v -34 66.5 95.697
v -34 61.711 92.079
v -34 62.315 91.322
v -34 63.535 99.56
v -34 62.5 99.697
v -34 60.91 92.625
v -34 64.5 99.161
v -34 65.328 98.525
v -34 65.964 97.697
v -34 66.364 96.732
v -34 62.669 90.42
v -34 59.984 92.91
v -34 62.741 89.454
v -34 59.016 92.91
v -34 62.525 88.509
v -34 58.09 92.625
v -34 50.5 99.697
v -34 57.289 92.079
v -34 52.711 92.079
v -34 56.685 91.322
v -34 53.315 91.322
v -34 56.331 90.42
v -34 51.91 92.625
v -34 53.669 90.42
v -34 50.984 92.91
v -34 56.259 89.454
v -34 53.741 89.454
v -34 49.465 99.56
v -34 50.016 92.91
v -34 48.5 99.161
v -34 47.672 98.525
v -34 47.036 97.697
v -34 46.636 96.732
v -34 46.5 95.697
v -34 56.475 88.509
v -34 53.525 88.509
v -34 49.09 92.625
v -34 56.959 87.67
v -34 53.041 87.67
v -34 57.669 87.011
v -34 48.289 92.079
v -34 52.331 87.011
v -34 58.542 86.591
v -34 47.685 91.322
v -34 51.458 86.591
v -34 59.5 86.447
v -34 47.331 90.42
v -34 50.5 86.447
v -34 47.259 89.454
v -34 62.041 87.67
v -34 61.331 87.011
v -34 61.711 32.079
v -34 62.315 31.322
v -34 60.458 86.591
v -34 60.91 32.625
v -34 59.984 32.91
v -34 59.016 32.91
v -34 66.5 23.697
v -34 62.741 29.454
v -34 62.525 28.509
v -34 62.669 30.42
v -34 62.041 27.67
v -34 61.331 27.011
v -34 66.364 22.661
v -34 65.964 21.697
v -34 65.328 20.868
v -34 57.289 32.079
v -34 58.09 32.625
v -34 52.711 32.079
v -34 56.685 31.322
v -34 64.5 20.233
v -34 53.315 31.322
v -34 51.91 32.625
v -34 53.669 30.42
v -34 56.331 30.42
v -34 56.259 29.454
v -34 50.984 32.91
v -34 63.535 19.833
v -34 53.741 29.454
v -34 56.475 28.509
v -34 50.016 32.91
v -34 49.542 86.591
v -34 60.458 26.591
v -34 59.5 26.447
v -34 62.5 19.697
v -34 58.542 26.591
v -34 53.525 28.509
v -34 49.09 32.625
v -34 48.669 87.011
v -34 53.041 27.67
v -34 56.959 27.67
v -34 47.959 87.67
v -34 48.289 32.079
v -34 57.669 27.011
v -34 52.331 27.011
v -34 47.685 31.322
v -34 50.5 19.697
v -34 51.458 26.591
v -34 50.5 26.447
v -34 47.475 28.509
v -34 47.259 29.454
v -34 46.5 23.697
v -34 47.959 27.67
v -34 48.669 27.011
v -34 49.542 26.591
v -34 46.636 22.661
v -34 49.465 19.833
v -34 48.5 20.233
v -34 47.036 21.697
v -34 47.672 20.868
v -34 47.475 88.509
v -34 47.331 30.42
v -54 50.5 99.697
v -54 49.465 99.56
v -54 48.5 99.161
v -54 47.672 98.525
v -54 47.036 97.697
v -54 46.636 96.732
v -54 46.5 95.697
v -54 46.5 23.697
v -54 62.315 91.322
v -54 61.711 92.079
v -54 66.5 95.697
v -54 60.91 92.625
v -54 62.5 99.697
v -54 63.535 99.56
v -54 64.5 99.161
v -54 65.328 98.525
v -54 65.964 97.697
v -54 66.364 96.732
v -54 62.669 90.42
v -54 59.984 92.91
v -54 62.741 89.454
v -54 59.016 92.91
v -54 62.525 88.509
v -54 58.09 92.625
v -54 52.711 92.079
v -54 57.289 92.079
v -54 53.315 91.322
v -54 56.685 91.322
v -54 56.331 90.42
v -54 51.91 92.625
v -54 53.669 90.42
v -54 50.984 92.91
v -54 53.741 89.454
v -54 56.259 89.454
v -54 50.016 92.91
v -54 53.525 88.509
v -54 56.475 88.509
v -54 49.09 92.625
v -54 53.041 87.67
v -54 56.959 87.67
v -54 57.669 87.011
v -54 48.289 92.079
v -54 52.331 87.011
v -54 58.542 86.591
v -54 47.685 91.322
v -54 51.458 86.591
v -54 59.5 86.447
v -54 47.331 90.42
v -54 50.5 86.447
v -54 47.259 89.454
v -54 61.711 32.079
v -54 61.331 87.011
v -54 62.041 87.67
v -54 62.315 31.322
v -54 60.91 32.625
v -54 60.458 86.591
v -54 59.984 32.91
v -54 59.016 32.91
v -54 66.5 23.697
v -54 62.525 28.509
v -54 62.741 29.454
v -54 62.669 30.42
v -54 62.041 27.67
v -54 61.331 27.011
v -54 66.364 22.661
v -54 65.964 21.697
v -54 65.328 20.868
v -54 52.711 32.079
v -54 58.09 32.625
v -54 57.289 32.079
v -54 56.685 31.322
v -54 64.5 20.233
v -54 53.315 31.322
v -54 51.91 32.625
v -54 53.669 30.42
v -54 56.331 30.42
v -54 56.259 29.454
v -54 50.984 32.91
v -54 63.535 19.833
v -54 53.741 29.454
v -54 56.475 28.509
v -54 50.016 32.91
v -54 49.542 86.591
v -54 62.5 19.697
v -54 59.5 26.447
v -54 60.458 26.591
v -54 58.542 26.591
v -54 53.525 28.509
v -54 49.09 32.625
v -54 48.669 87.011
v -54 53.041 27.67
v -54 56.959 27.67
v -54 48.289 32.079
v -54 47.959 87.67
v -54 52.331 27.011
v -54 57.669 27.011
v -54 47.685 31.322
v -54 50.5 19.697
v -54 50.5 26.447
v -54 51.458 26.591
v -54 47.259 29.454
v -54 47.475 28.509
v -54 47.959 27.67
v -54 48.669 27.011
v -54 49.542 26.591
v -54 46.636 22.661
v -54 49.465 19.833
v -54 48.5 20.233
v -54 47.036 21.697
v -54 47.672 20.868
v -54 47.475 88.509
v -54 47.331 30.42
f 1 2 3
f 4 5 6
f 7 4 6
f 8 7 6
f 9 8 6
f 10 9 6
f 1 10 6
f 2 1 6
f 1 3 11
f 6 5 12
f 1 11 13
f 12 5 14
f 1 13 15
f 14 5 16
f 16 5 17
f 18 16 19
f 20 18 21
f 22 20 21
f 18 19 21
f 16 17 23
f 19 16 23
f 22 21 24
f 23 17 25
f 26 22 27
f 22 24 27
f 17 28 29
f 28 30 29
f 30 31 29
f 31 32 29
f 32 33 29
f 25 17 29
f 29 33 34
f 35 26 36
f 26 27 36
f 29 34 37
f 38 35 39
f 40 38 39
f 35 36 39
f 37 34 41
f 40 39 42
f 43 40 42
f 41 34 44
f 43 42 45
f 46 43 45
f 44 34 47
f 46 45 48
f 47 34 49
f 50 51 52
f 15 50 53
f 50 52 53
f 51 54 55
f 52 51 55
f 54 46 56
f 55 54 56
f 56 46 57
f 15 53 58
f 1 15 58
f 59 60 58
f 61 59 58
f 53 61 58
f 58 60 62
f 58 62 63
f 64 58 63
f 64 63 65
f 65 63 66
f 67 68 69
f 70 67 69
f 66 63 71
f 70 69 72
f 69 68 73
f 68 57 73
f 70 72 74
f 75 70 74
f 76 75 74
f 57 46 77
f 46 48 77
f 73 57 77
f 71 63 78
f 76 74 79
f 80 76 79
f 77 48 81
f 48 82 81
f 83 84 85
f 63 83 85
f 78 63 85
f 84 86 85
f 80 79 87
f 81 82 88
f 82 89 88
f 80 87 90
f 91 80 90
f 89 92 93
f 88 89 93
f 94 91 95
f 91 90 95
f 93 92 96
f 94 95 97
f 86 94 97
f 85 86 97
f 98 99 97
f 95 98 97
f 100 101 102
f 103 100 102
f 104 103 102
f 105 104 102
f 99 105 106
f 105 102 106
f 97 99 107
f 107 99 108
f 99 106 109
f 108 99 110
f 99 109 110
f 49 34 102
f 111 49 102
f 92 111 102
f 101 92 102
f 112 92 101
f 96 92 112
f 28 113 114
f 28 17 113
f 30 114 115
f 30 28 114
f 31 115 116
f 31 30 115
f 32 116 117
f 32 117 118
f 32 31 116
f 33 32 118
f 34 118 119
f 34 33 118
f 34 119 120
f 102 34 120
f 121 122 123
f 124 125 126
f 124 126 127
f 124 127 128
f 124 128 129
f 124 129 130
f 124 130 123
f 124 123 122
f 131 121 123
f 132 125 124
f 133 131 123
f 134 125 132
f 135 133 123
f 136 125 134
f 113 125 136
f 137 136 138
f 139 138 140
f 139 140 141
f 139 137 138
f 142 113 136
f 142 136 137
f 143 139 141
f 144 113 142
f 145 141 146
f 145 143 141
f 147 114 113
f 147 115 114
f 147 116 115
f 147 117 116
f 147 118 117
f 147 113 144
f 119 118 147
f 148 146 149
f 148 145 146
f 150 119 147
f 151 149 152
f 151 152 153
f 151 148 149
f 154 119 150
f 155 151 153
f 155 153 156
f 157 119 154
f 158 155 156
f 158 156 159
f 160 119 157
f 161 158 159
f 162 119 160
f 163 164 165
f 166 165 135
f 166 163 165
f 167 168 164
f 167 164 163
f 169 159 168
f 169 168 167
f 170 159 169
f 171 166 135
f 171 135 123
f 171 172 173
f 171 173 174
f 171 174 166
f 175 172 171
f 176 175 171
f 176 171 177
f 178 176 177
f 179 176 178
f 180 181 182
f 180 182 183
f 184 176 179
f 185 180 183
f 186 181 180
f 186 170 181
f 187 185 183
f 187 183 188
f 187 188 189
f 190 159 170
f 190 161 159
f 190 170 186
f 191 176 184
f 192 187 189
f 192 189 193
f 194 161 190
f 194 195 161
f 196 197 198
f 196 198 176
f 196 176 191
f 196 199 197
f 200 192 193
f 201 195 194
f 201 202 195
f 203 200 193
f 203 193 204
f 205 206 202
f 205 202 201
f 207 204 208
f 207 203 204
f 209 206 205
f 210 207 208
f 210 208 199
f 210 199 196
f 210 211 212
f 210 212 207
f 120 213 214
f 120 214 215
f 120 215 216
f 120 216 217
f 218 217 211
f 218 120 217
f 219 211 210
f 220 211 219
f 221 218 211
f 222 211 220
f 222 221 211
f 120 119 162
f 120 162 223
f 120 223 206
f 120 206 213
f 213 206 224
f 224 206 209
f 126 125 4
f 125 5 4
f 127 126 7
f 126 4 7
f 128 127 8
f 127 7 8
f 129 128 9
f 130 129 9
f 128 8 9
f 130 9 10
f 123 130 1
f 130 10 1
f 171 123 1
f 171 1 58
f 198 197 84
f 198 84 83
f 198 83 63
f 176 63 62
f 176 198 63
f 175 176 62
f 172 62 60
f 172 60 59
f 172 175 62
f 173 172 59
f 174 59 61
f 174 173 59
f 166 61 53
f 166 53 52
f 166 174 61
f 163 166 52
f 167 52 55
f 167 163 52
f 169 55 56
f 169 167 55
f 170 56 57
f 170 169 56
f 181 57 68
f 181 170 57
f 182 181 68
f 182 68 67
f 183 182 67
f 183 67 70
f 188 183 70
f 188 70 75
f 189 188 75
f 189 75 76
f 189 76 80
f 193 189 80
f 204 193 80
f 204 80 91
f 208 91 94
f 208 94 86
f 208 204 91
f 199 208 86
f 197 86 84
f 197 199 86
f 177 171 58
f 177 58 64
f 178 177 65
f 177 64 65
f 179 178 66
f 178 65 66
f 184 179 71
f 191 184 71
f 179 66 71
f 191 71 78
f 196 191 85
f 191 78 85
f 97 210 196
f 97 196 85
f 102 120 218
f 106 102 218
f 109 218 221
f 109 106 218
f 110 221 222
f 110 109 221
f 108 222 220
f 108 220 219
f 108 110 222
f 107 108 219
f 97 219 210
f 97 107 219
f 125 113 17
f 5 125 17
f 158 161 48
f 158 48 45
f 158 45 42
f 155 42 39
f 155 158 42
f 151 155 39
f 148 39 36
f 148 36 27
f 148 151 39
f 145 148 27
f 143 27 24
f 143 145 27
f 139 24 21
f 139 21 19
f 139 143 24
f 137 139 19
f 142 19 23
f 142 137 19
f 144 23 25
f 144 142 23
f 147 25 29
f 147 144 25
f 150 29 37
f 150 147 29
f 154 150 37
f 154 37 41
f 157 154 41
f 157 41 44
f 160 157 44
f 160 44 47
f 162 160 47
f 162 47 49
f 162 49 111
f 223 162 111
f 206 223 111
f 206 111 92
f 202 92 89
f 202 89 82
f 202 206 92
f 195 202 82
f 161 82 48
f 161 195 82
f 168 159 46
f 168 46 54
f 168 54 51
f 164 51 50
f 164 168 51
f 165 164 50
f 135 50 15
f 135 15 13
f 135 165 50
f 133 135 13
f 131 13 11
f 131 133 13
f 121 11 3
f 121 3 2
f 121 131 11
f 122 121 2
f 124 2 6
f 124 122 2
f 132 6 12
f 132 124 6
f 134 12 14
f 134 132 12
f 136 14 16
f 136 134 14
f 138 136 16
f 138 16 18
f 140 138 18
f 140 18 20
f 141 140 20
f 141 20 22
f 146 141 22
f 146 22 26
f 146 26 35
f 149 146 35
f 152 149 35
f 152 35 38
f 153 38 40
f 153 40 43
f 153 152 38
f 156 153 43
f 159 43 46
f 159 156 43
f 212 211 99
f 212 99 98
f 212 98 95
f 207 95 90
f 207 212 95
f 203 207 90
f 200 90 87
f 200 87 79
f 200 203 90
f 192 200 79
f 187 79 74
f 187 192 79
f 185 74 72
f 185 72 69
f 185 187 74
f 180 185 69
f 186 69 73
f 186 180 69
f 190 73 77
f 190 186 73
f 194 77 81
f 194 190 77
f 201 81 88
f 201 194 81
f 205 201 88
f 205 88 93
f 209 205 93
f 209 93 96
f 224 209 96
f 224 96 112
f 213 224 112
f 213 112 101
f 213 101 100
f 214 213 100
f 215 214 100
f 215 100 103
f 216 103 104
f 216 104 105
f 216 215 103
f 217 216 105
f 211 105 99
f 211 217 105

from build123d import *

# Parameters (mm, degrees)
BOSS_EXTRUDE1_DEPTH      = 90
FILLET1_R                = 7.5
FILLET2_R                = 2
SKETCH2_W                = 20
SKETCH2_H                = 80
SKETCH2_W_2              = 32
BOSS_EXTRUDE2_DEPTH      = 20
SKETCH3_R                = 2.5
BOSS_EXTRUDE3_DEPTH      = 111
BOSS_EXTRUDE4_START      = 7.5
SKETCH4_W                = 80
SKETCH4_H                = 20
SKETCH4_R                = 3.25
BOSS_EXTRUDE4_DEPTH      = 20
MOVE_FACE1_BY            = 1.5
MOVE_FACE2_BY            = 1.5
FILLET3_R                = 4
FILLET4_R                = 4
CUT_EXTRUDE1_DEPTH       = 2
BOSS_EXTRUDE5_DEPTH      = 2
SKETCH7_W                = 58
SKETCH7_H                = 15
CUT_EXTRUDE2_DEPTH       = 0.5
SKETCH8_R                = 10
BOSS_EXTRUDE6_DEPTH      = 1.5
SKETCH10_R               = 4.25
SKETCH10_R_2             = 2.75
CUT_EXTRUDE_THIN1_DEPTH  = 1.5
SKETCH11_RX              = 5
SKETCH11_RY              = 2.5
BOSS_EXTRUDE7_DEPTH      = 1.5
LPATTERN1_COUNT          = 3
LPATTERN1_PITCH          = 24
SKETCH12_RX              = 5
SKETCH12_RY              = 2.5
BOSS_EXTRUDE8_DEPTH      = 1.5
LPATTERN2_START          = 113.13708499
LPATTERN2_DEPTH          = 1.5
FILLET7_R                = 7.5
FILLET5_R                = 5
FILLET6_R                = 2
SHELL1_T                 = -1
SKETCH14_R               = 14
BOSS_EXTRUDE9_DEPTH      = 1
BOSS_EXTRUDE10_DEPTH     = 1
BOSS_EXTRUDE11_START     = -30
BOSS_EXTRUDE11_OUTLINE_R = 13
BOSS_EXTRUDE11_DEPTH     = 10
BOSS_EXTRUDE12_REACH     = 233.484
SKETCH18_R               = 3
SKETCH17_W               = 1.5
SKETCH17_H               = 20
SKETCH17_W_2             = 20
SKETCH17_H_2             = 1.5
EXTRUDE_THIN1_DEPTH      = 63.5
SKETCH20_R               = 12.5
BOSS_EXTRUDE13_DEPTH     = 5
FILLET8_R                = 2


# Read off the part's stored shape, not the designer's step: LPattern2, Body-Move/Copy1, Boss-Extrude11
with BuildPart() as part:
    # Sketch1 → Boss-Extrude1 (new, symmetric)
    with BuildSketch(Plane(origin=(0, 0, 0), x_dir=(0, 0, -1), z_dir=(1, 0, 0))):
        Polygon((0, 0), (0, 45), (-115, 45), (-160, 0), align=None)
    extrude(amount=BOSS_EXTRUDE1_DEPTH, both=True)

    # Fillet1
    fillet1_edges = [part.edges().sort_by_distance(p)[0] for p in [
        (0, 0, 160),
        (0, 45, 115),
        (0, 45, 0),
        (0, 0, 0),
    ]]
    fillet(fillet1_edges, radius=FILLET1_R)

    # Fillet2
    fillet2_edges = [part.edges().sort_by_distance(p)[0] for p in [
        (-90, 0, 74.696699141),
        (90, 0, 74.696699141),
        (-90, 27.803300859, 132.196699141),
        (-90, 45, 59.696699141),
        (-90, 22.5, 0),
        (-90, 44.429096494, 114.763524025),
        (-90, 2.196699141, 2.196699141),
        (-90, 42.803300859, 2.196699141),
        (-90, 4.629874257, 148.822494776),
        (90, 27.803300859, 132.196699141),
        (90, 22.5, 0),
        (90, 45, 59.696699141),
        (90, 44.429096494, 114.763524025),
        (90, 2.196699141, 2.196699141),
        (90, 42.803300859, 2.196699141),
        (90, 4.629874257, 148.822494776),
    ]]
    fillet(fillet2_edges, radius=FILLET2_R)

    # Sketch2 → Boss-Extrude2 (add)
    with BuildSketch(Plane(origin=(0, 45, 0), x_dir=(1, 0, 0), z_dir=(0, 1, 0))):
        with Locations((-71.5, -59.696699141)):
            Rectangle(SKETCH2_W, SKETCH2_H)
        with Locations((65.5, -59.696699141)):
            Rectangle(SKETCH2_W_2, SKETCH2_H)
    extrude(amount=BOSS_EXTRUDE2_DEPTH)

    # Sketch3 → Boss-Extrude3 (add)
    with BuildSketch(Plane(origin=(-61.5, 0, 0), x_dir=(0, 0, -1), z_dir=(1, 0, 0))):
        with Locations(Location((-89.696699141, 59.5, 0), (0, 0, 180))):
            Circle(SKETCH3_R)
        with Locations(Location((-89.696699141, 50.5, 0), (0, 0, 180))):
            Circle(SKETCH3_R)
        with Locations(Location((-29.696699141, 50.5, 0), (0, 0, 180))):
            Circle(SKETCH3_R)
        with Locations(Location((-29.696699141, 59.5, 0), (0, 0, 180))):
            Circle(SKETCH3_R)
    extrude(amount=BOSS_EXTRUDE3_DEPTH)

    # Fillet3
    fillet3_edges = [part.edges().sort_by_distance(p)[0] for p in [
        (65.5, 65, 99.696699141),
        (65.5, 65, 19.696699141),
        (-71.5, 65, 99.696699141),
        (-71.5, 65, 19.696699141),
    ]]
    fillet(fillet3_edges, radius=FILLET3_R)

    # Sketch5 → Cut-Extrude1 (cut)
    with BuildSketch(Plane(origin=(0, 80, 80), x_dir=(1, 0, 0), z_dir=(0, 0.7071067811865511, 0.707106781186544))):
        with BuildLine():
            Line((-65, -56.317279836), (65, -56.317279836))
            ThreePointArc((65, -56.317279836), (66.767766953, -57.049512883), (67.5, -58.817279836))
            Line((67.5, -58.817279836), (67.5, -88.817279836))
            ThreePointArc((67.5, -88.817279836), (66.767766953, -90.585046789), (65, -91.317279836))
            Line((65, -91.317279836), (-65, -91.317279836))
            ThreePointArc((-65, -91.317279836), (-66.767766953, -90.585046789), (-67.5, -88.817279836))
            Line((-67.5, -88.817279836), (-67.5, -58.817279836))
            ThreePointArc((-67.5, -58.817279836), (-66.767766953, -57.049512883), (-65, -56.317279836))
        make_face()
    extrude(amount=-CUT_EXTRUDE1_DEPTH, mode=Mode.SUBTRACT)


with BuildPart() as body_2:
    # Sketch4 → Boss-Extrude4 (new body)
    with BuildSketch(Plane(origin=(-61.5, 0, 0), x_dir=(0, 0, -1), z_dir=(1, 0, 0)).offset(BOSS_EXTRUDE4_START)):
        with Locations((-59.696699141, 55)):
            Rectangle(SKETCH4_W, SKETCH4_H)
        with Locations((-89.696699141, 59.5)):
            Circle(SKETCH4_R, mode=Mode.SUBTRACT)
        with Locations((-89.696699141, 50.5)):
            Circle(SKETCH4_R, mode=Mode.SUBTRACT)
        with Locations((-29.696699141, 59.5)):
            Circle(SKETCH4_R, mode=Mode.SUBTRACT)
        with Locations((-29.696699141, 50.5)):
            Circle(SKETCH4_R, mode=Mode.SUBTRACT)
    extrude(amount=BOSS_EXTRUDE4_DEPTH)

    # Move Face1: a face moved outward by 1.5
    extrude(body_2.faces().sort_by_distance((-44, 65, 59.696699141))[0], amount=MOVE_FACE1_BY, dir=(0, 1, 0))

    # Move Face2: a face moved inward by 1.5
    extrude(body_2.faces().sort_by_distance((-44, 45, 59.696699141))[0], amount=MOVE_FACE2_BY, dir=(0, 1, 0), mode=Mode.SUBTRACT)

    # Fillet4
    fillet4_edges = [body_2.edges().sort_by_distance(p)[0] for p in [
        (-44, 66.5, 99.696699141),
        (-44, 66.5, 19.696699141),
        (-44, 46.5, 19.696699141),
        (-44, 46.5, 99.696699141),
    ]]
    fillet(fillet4_edges, radius=FILLET4_R)


with BuildPart() as body_3:
    # Sketch6 → Boss-Extrude5 (new body)
    with BuildSketch(Plane(origin=(0, 78.585786438, 78.585786438), x_dir=(1, 0, 0), z_dir=(0, 0.7071067811865509, 0.7071067811865441))):
        with BuildLine():
            Line((65, -56.317279836), (-65, -56.317279836))
            ThreePointArc((-65, -56.317279836), (-66.767766953, -57.049512883), (-67.5, -58.817279836))
            Line((-67.5, -58.817279836), (-67.5, -88.817279836))
            ThreePointArc((-67.5, -88.817279836), (-66.767766953, -90.585046789), (-65, -91.317279836))
            Line((-65, -91.317279836), (65, -91.317279836))
            ThreePointArc((65, -91.317279836), (66.767766953, -90.585046789), (67.5, -88.817279836))
            Line((67.5, -88.817279836), (67.5, -58.817279836))
            ThreePointArc((67.5, -58.817279836), (66.767766953, -57.049512883), (65, -56.317279836))
        make_face()
    extrude(amount=BOSS_EXTRUDE5_DEPTH)

    # Sketch7 → Cut-Extrude2 (cut)
    with BuildSketch(Plane(origin=(0, 80, 80), x_dir=(1, 0, 0), z_dir=(0, 0.7071067811865509, 0.7071067811865441))):
        with Locations((-28.5, -71.817279836)):
            Rectangle(SKETCH7_W, SKETCH7_H)
    extrude(amount=-CUT_EXTRUDE2_DEPTH, mode=Mode.SUBTRACT)

    # Sketch8 → Boss-Extrude6 (add)
    with BuildSketch(Plane(origin=(0, 80, 80), x_dir=(1, 0, 0), z_dir=(0, 0.7071067811865509, 0.7071067811865441))):
        with Locations(Location((15.5, -71.817279836, 0), (0, 0, 270))):
            Circle(SKETCH8_R)
    extrude(amount=BOSS_EXTRUDE6_DEPTH)

    # Sketch10 → Cut-Extrude-Thin1 (cut)
    # profile 1 of 5: a face of its own
    with BuildSketch(Plane(origin=(0, 81.060660172, 81.060660172), x_dir=(1, 0, 0), z_dir=(0, 0.7071067811865509, 0.7071067811865441))):
        with Locations((15.5, -71.817279836)):
            Circle(SKETCH10_R)
        with Locations((15.5, -71.817279836)):
            Circle(SKETCH10_R_2, mode=Mode.SUBTRACT)
    # profile 2 of 5: a face of its own
    with BuildSketch(Plane(origin=(0, 81.060660172, 81.060660172), x_dir=(1, 0, 0), z_dir=(0, 0.7071067811865509, 0.7071067811865441))):
        Polygon((7.898602102, -65.27654211), (12.49479618, -69.872736188), (13.555456352, -68.812076016), (8.959262274, -64.215881939), align=None)
    # profile 3 of 5: a face of its own
    with BuildSketch(Plane(origin=(0, 81.060660172, 81.060660172), x_dir=(1, 0, 0), z_dir=(0, 0.7071067811865509, 0.7071067811865441))):
        Polygon((22.040737726, -64.215881939), (17.444543648, -68.812076016), (18.50520382, -69.872736188), (23.101397898, -65.27654211), align=None)
    # profile 4 of 5: a face of its own
    with BuildSketch(Plane(origin=(0, 81.060660172, 81.060660172), x_dir=(1, 0, 0), z_dir=(0, 0.7071067811865509, 0.7071067811865441))):
        Polygon((17.444543648, -74.822483656), (22.040737726, -79.418677734), (23.101397898, -78.358017562), (18.50520382, -73.761823485), align=None)
    # profile 5 of 5: a face of its own
    with BuildSketch(Plane(origin=(0, 81.060660172, 81.060660172), x_dir=(1, 0, 0), z_dir=(0, 0.7071067811865509, 0.7071067811865441))):
        Polygon((12.49479618, -73.761823485), (7.898602102, -78.358017562), (8.959262274, -79.418677734), (13.555456352, -74.822483656), align=None)
    extrude(amount=-CUT_EXTRUDE_THIN1_DEPTH, mode=Mode.SUBTRACT)

    # Sketch11 → Boss-Extrude7 (add)
    with BuildSketch(Plane(origin=(0, 80, 80), x_dir=(1, 0, 0), z_dir=(0, 0.7071067811865509, 0.7071067811865441))):
        with Locations((-52.5, -85.317279836)):
            Ellipse(SKETCH11_RX, SKETCH11_RY)
    boss_extrude7 = extrude(amount=BOSS_EXTRUDE7_DEPTH)

    # LPattern1: Boss-Extrude7 ×3
    with Locations(*[(i * LPATTERN1_PITCH, 0, 0) for i in range(1, LPATTERN1_COUNT)]):
        add(boss_extrude7)

    # Sketch12 → Boss-Extrude8 (add)
    with BuildSketch(Plane(origin=(0, 80, 80), x_dir=(1, 0, 0), z_dir=(0, 0.7071067811865509, 0.7071067811865441))):
        with Locations((32.5, -66.317279836)):
            Ellipse(SKETCH12_RX, SKETCH12_RY)
    extrude(amount=BOSS_EXTRUDE8_DEPTH)

    # LPattern2 outline → LPattern2 (add)
    with BuildSketch(Plane(origin=(0, 0, 0), x_dir=(1, 0, 0), z_dir=(0, 0.707106781186551, 0.7071067811865439)).offset(LPATTERN2_START)):
        with BuildLine():
            add(Edge.make_bspline(
                [(37.5, -74.317279836), (37.5, -69.987152818), (30, -72.152216327), (22.5, -74.317279836), (30, -76.482343346), (37.5, -78.647406855), (37.5, -74.317279836)],
                knots=[0, 0, 0, 2.094395102, 2.094395102, 4.188790205, 4.188790205, 6.283185307, 6.283185307, 6.283185307], degree=2, weights=[1, 0.5, 1, 0.5, 1, 0.5, 1]))
        make_face()
        with BuildLine():
            add(Edge.make_bspline(
                [(37.5, -82.317279836), (37.5, -77.987152818), (30, -80.152216327), (22.5, -82.317279836), (30, -84.482343346), (37.5, -86.647406855), (37.5, -82.317279836)],
                knots=[0, 0, 0, 2.094395102, 2.094395102, 4.188790205, 4.188790205, 6.283185307, 6.283185307, 6.283185307], degree=2, weights=[1, 0.5, 1, 0.5, 1, 0.5, 1]))
        make_face()
        with BuildLine():
            add(Edge.make_bspline(
                [(49.5, -66.317279836), (49.5, -61.987152818), (42, -64.152216327), (34.5, -66.317279836), (42, -68.482343346), (49.5, -70.647406855), (49.5, -66.317279836)],
                knots=[0, 0, 0, 2.094395102, 2.094395102, 4.188790205, 4.188790205, 6.283185307, 6.283185307, 6.283185307], degree=2, weights=[1, 0.5, 1, 0.5, 1, 0.5, 1]))
        make_face()
        with BuildLine():
            add(Edge.make_bspline(
                [(49.5, -74.317279836), (49.5, -69.987152818), (42, -72.152216327), (34.5, -74.317279836), (42, -76.482343346), (49.5, -78.647406855), (49.5, -74.317279836)],
                knots=[0, 0, 0, 2.094395102, 2.094395102, 4.188790205, 4.188790205, 6.283185307, 6.283185307, 6.283185307], degree=2, weights=[1, 0.5, 1, 0.5, 1, 0.5, 1]))
        make_face()
        with BuildLine():
            add(Edge.make_bspline(
                [(49.5, -82.317279836), (49.5, -77.987152818), (42, -80.152216327), (34.5, -82.317279836), (42, -84.482343346), (49.5, -86.647406855), (49.5, -82.317279836)],
                knots=[0, 0, 0, 2.094395102, 2.094395102, 4.188790205, 4.188790205, 6.283185307, 6.283185307, 6.283185307], degree=2, weights=[1, 0.5, 1, 0.5, 1, 0.5, 1]))
        make_face()
        with BuildLine():
            add(Edge.make_bspline(
                [(61.5, -66.317279836), (61.5, -61.987152818), (54, -64.152216327), (46.5, -66.317279836), (54, -68.482343346), (61.5, -70.647406855), (61.5, -66.317279836)],
                knots=[0, 0, 0, 2.094395102, 2.094395102, 4.188790205, 4.188790205, 6.283185307, 6.283185307, 6.283185307], degree=2, weights=[1, 0.5, 1, 0.5, 1, 0.5, 1]))
        make_face()
        with BuildLine():
            add(Edge.make_bspline(
                [(61.5, -74.317279836), (61.5, -69.987152818), (54, -72.152216327), (46.5, -74.317279836), (54, -76.482343346), (61.5, -78.647406855), (61.5, -74.317279836)],
                knots=[0, 0, 0, 2.094395102, 2.094395102, 4.188790205, 4.188790205, 6.283185307, 6.283185307, 6.283185307], degree=2, weights=[1, 0.5, 1, 0.5, 1, 0.5, 1]))
        make_face()
        with BuildLine():
            add(Edge.make_bspline(
                [(61.5, -82.317279836), (61.5, -77.987152818), (54, -80.152216327), (46.5, -82.317279836), (54, -84.482343346), (61.5, -86.647406855), (61.5, -82.317279836)],
                knots=[0, 0, 0, 2.094395102, 2.094395102, 4.188790205, 4.188790205, 6.283185307, 6.283185307, 6.283185307], degree=2, weights=[1, 0.5, 1, 0.5, 1, 0.5, 1]))
        make_face()
    extrude(amount=LPATTERN2_DEPTH)


with BuildPart() as body_4:
    # Sketch13 → Revolve1 (revolve)
    with BuildSketch(Plane.XY.offset(59.696699141), mode=Mode.PRIVATE) as revolve1_sk:
        Polygon((11.5, 70), (11.5, 85), (105.301145933, 85), (111.5, 74.263269807), (121.5, 72.5), (121.5, 70), align=None)
    revolve(revolve1_sk.sketch.rotate(Axis((11.5, 70, 59.696699141), (1, 0, 0)), 90), axis=Axis((11.5, 70, 59.696699141), (1, 0, 0)))

    # Fillet5
    fillet5_edges = [body_4.edges().sort_by_distance(p)[0] for p in [
        (105.301145933, 70, 44.696699141),
    ]]
    fillet(fillet5_edges, radius=FILLET5_R)

    # Fillet6
    fillet6_edges = [body_4.edges().sort_by_distance(p)[0] for p in [
        (111.5, 70, 55.433429334),
    ]]
    fillet(fillet6_edges, radius=FILLET6_R)

    # Shell1
    shell1_openings = [body_4.faces().sort_by_distance(p)[0] for p in [
        (121.5, 70, 59.696699141),
        (11.5, 70, 59.696699141),
    ]]
    offset(amount=SHELL1_T, openings=shell1_openings, kind=Kind.INTERSECTION)

    # Sketch14 → Boss-Extrude9 (add)
    with BuildSketch(Plane.ZY.offset(-11.5)):
        with BuildLine():
            Line((55.696699141, 85.491933385), (40.696699141, 81.618950039))
            ThreePointArc((40.696699141, 81.618950039), (31.696699141, 70), (40.696699141, 58.381049961))
            Line((40.696699141, 58.381049961), (55.696699141, 54.508066615))
            ThreePointArc((55.696699141, 54.508066615), (59.696699141, 54), (63.696699141, 54.508066615))
            Line((63.696699141, 54.508066615), (78.696699141, 58.381049961))
            ThreePointArc((78.696699141, 58.381049961), (87.696699141, 70), (78.696699141, 81.618950039))
            Line((78.696699141, 81.618950039), (63.696699141, 85.491933385))
            ThreePointArc((63.696699141, 85.491933385), (59.696699141, 86), (55.696699141, 85.491933385))
        make_face()
        with Locations((59.696699141, 70)):
            Circle(SKETCH14_R, mode=Mode.SUBTRACT)
    extrude(amount=BOSS_EXTRUDE9_DEPTH)


with BuildPart() as body_5:
    # Body-Move/Copy1 outline → Body-Move/Copy1 (revolve)
    with BuildSketch(Plane(origin=(0, 70, 59.696699141), x_dir=(0, 1, 0), z_dir=(0, 0, -1))):
        Polygon((0, 121.5), (0, 11.5), (15, 11.5), (15, 105.301145933), (4.263269807, 111.5), (2.5, 121.5), align=None)
    revolve(axis=Axis((0, 70, 59.696699141), (1, 0, 0)))


with BuildPart() as part_1:
    add(part.part)

    # Combine1: cut body 5
    add(body_5.part, mode=Mode.SUBTRACT)

    # Fillet7
    fillet7_edges = [part_1.edges().sort_by_distance(p)[0] for p in [
        (65.5, 65, 73.838834765),
        (65.5, 65, 45.554563517),
    ]]
    fillet(fillet7_edges, radius=FILLET7_R)

    # Sketch20 → Boss-Extrude13 (add)
    with BuildSketch(Plane.XZ):
        with Locations(Location((-60, 116.893398282, 0), (0, 0, 90))):
            Circle(SKETCH20_R)
        with Locations(Location((-60, 32.5, 0), (0, 0, 90))):
            Circle(SKETCH20_R)
        with Locations(Location((60, 32.5, 0), (0, 0, 90))):
            Circle(SKETCH20_R)
        with Locations(Location((60, 116.893398282, 0), (0, 0, 90))):
            Circle(SKETCH20_R)
    extrude(amount=BOSS_EXTRUDE13_DEPTH)

    # Fillet8
    fillet8_edges = [part_1.edges().sort_by_distance(p)[0] for p in [
        (-60, -5, 104.393398282),
        (-60, -5, 20),
        (60, -5, 20),
        (60, -5, 104.393398282),
    ]]
    fillet(fillet8_edges, radius=FILLET8_R)


with BuildPart() as body_5_2:
    # Sketch15 → Boss-Extrude10 (new body)
    with BuildSketch(Plane(origin=(-34, 0, 0), x_dir=(0, 0, -1), z_dir=(1, 0, 0))):
        with BuildLine():
            Line((-63.696699141, 85.491933385), (-78.696699141, 81.618950039))
            ThreePointArc((-78.696699141, 81.618950039), (-87.696699141, 70), (-78.696699141, 58.381049961))
            Line((-78.696699141, 58.381049961), (-63.696699141, 54.508066615))
            ThreePointArc((-63.696699141, 54.508066615), (-59.696699141, 54), (-55.696699141, 54.508066615))
            Line((-55.696699141, 54.508066615), (-40.696699141, 58.381049961))
            ThreePointArc((-40.696699141, 58.381049961), (-31.696699141, 70), (-40.696699141, 81.618950039))
            Line((-40.696699141, 81.618950039), (-55.696699141, 85.491933385))
            ThreePointArc((-55.696699141, 85.491933385), (-59.696699141, 86), (-63.696699141, 85.491933385))
        make_face()
    extrude(amount=BOSS_EXTRUDE10_DEPTH)


with BuildPart() as body_6:
    # Boss-Extrude11 outline → Boss-Extrude11 (new body)
    with BuildSketch(Plane.ZY.offset(-10.5).offset(BOSS_EXTRUDE11_START)):
        with Locations((59.696699141, 70)):
            Circle(BOSS_EXTRUDE11_OUTLINE_R)
    extrude(amount=BOSS_EXTRUDE11_DEPTH)

    # Sketch18 → Boss-Extrude12 (add, up to next)
    with BuildSketch(Plane(origin=(-33, 0, 0), x_dir=(0, 0, -1), z_dir=(1, 0, 0)), mode=Mode.PRIVATE) as boss_extrude12_sk1:
        with Locations(Location((-59.696699141, 70, 0), (0, 0, 180))):
            Circle(SKETCH18_R)
    boss_extrude12_tool1 = extrude(boss_extrude12_sk1.sketch, amount=BOSS_EXTRUDE12_REACH, mode=Mode.PRIVATE) - body_6.part

    add(body_5_2.part)  # Boss-Extrude12 merges body 5 2
    add(boss_extrude12_tool1.solids().sort_by_distance((-33, 70, 59.696699))[0])

    # Sketch17 → Extrude-Thin1 (add)
    with BuildSketch(Plane(origin=(-33, 0, 0), x_dir=(0, 0, -1), z_dir=(1, 0, 0))):
        with Locations((-59.696699141, 70)):
            Rectangle(SKETCH17_W, SKETCH17_H)
        with Locations((-59.696699141, 70)):
            Rectangle(SKETCH17_W_2, SKETCH17_H_2)
    extrude(amount=EXTRUDE_THIN1_DEPTH)

    # Sketch19 → Cut-Revolve3 (revolve, cut)
    with BuildSketch(Plane.XY.offset(59.696699141), mode=Mode.PRIVATE) as cut_revolve3_sk:
        Polygon((-33, 76.452368755), (-18, 80), (-18, 81.618950039), (-33, 81.618950039), align=None)
    revolve(cut_revolve3_sk.sketch.rotate(Axis((111.5, 70, 59.696699141), (-1, 0, 0)), 270), axis=Axis((111.5, 70, 59.696699141), (-1, 0, 0)), mode=Mode.SUBTRACT)


solid = body_2.part
